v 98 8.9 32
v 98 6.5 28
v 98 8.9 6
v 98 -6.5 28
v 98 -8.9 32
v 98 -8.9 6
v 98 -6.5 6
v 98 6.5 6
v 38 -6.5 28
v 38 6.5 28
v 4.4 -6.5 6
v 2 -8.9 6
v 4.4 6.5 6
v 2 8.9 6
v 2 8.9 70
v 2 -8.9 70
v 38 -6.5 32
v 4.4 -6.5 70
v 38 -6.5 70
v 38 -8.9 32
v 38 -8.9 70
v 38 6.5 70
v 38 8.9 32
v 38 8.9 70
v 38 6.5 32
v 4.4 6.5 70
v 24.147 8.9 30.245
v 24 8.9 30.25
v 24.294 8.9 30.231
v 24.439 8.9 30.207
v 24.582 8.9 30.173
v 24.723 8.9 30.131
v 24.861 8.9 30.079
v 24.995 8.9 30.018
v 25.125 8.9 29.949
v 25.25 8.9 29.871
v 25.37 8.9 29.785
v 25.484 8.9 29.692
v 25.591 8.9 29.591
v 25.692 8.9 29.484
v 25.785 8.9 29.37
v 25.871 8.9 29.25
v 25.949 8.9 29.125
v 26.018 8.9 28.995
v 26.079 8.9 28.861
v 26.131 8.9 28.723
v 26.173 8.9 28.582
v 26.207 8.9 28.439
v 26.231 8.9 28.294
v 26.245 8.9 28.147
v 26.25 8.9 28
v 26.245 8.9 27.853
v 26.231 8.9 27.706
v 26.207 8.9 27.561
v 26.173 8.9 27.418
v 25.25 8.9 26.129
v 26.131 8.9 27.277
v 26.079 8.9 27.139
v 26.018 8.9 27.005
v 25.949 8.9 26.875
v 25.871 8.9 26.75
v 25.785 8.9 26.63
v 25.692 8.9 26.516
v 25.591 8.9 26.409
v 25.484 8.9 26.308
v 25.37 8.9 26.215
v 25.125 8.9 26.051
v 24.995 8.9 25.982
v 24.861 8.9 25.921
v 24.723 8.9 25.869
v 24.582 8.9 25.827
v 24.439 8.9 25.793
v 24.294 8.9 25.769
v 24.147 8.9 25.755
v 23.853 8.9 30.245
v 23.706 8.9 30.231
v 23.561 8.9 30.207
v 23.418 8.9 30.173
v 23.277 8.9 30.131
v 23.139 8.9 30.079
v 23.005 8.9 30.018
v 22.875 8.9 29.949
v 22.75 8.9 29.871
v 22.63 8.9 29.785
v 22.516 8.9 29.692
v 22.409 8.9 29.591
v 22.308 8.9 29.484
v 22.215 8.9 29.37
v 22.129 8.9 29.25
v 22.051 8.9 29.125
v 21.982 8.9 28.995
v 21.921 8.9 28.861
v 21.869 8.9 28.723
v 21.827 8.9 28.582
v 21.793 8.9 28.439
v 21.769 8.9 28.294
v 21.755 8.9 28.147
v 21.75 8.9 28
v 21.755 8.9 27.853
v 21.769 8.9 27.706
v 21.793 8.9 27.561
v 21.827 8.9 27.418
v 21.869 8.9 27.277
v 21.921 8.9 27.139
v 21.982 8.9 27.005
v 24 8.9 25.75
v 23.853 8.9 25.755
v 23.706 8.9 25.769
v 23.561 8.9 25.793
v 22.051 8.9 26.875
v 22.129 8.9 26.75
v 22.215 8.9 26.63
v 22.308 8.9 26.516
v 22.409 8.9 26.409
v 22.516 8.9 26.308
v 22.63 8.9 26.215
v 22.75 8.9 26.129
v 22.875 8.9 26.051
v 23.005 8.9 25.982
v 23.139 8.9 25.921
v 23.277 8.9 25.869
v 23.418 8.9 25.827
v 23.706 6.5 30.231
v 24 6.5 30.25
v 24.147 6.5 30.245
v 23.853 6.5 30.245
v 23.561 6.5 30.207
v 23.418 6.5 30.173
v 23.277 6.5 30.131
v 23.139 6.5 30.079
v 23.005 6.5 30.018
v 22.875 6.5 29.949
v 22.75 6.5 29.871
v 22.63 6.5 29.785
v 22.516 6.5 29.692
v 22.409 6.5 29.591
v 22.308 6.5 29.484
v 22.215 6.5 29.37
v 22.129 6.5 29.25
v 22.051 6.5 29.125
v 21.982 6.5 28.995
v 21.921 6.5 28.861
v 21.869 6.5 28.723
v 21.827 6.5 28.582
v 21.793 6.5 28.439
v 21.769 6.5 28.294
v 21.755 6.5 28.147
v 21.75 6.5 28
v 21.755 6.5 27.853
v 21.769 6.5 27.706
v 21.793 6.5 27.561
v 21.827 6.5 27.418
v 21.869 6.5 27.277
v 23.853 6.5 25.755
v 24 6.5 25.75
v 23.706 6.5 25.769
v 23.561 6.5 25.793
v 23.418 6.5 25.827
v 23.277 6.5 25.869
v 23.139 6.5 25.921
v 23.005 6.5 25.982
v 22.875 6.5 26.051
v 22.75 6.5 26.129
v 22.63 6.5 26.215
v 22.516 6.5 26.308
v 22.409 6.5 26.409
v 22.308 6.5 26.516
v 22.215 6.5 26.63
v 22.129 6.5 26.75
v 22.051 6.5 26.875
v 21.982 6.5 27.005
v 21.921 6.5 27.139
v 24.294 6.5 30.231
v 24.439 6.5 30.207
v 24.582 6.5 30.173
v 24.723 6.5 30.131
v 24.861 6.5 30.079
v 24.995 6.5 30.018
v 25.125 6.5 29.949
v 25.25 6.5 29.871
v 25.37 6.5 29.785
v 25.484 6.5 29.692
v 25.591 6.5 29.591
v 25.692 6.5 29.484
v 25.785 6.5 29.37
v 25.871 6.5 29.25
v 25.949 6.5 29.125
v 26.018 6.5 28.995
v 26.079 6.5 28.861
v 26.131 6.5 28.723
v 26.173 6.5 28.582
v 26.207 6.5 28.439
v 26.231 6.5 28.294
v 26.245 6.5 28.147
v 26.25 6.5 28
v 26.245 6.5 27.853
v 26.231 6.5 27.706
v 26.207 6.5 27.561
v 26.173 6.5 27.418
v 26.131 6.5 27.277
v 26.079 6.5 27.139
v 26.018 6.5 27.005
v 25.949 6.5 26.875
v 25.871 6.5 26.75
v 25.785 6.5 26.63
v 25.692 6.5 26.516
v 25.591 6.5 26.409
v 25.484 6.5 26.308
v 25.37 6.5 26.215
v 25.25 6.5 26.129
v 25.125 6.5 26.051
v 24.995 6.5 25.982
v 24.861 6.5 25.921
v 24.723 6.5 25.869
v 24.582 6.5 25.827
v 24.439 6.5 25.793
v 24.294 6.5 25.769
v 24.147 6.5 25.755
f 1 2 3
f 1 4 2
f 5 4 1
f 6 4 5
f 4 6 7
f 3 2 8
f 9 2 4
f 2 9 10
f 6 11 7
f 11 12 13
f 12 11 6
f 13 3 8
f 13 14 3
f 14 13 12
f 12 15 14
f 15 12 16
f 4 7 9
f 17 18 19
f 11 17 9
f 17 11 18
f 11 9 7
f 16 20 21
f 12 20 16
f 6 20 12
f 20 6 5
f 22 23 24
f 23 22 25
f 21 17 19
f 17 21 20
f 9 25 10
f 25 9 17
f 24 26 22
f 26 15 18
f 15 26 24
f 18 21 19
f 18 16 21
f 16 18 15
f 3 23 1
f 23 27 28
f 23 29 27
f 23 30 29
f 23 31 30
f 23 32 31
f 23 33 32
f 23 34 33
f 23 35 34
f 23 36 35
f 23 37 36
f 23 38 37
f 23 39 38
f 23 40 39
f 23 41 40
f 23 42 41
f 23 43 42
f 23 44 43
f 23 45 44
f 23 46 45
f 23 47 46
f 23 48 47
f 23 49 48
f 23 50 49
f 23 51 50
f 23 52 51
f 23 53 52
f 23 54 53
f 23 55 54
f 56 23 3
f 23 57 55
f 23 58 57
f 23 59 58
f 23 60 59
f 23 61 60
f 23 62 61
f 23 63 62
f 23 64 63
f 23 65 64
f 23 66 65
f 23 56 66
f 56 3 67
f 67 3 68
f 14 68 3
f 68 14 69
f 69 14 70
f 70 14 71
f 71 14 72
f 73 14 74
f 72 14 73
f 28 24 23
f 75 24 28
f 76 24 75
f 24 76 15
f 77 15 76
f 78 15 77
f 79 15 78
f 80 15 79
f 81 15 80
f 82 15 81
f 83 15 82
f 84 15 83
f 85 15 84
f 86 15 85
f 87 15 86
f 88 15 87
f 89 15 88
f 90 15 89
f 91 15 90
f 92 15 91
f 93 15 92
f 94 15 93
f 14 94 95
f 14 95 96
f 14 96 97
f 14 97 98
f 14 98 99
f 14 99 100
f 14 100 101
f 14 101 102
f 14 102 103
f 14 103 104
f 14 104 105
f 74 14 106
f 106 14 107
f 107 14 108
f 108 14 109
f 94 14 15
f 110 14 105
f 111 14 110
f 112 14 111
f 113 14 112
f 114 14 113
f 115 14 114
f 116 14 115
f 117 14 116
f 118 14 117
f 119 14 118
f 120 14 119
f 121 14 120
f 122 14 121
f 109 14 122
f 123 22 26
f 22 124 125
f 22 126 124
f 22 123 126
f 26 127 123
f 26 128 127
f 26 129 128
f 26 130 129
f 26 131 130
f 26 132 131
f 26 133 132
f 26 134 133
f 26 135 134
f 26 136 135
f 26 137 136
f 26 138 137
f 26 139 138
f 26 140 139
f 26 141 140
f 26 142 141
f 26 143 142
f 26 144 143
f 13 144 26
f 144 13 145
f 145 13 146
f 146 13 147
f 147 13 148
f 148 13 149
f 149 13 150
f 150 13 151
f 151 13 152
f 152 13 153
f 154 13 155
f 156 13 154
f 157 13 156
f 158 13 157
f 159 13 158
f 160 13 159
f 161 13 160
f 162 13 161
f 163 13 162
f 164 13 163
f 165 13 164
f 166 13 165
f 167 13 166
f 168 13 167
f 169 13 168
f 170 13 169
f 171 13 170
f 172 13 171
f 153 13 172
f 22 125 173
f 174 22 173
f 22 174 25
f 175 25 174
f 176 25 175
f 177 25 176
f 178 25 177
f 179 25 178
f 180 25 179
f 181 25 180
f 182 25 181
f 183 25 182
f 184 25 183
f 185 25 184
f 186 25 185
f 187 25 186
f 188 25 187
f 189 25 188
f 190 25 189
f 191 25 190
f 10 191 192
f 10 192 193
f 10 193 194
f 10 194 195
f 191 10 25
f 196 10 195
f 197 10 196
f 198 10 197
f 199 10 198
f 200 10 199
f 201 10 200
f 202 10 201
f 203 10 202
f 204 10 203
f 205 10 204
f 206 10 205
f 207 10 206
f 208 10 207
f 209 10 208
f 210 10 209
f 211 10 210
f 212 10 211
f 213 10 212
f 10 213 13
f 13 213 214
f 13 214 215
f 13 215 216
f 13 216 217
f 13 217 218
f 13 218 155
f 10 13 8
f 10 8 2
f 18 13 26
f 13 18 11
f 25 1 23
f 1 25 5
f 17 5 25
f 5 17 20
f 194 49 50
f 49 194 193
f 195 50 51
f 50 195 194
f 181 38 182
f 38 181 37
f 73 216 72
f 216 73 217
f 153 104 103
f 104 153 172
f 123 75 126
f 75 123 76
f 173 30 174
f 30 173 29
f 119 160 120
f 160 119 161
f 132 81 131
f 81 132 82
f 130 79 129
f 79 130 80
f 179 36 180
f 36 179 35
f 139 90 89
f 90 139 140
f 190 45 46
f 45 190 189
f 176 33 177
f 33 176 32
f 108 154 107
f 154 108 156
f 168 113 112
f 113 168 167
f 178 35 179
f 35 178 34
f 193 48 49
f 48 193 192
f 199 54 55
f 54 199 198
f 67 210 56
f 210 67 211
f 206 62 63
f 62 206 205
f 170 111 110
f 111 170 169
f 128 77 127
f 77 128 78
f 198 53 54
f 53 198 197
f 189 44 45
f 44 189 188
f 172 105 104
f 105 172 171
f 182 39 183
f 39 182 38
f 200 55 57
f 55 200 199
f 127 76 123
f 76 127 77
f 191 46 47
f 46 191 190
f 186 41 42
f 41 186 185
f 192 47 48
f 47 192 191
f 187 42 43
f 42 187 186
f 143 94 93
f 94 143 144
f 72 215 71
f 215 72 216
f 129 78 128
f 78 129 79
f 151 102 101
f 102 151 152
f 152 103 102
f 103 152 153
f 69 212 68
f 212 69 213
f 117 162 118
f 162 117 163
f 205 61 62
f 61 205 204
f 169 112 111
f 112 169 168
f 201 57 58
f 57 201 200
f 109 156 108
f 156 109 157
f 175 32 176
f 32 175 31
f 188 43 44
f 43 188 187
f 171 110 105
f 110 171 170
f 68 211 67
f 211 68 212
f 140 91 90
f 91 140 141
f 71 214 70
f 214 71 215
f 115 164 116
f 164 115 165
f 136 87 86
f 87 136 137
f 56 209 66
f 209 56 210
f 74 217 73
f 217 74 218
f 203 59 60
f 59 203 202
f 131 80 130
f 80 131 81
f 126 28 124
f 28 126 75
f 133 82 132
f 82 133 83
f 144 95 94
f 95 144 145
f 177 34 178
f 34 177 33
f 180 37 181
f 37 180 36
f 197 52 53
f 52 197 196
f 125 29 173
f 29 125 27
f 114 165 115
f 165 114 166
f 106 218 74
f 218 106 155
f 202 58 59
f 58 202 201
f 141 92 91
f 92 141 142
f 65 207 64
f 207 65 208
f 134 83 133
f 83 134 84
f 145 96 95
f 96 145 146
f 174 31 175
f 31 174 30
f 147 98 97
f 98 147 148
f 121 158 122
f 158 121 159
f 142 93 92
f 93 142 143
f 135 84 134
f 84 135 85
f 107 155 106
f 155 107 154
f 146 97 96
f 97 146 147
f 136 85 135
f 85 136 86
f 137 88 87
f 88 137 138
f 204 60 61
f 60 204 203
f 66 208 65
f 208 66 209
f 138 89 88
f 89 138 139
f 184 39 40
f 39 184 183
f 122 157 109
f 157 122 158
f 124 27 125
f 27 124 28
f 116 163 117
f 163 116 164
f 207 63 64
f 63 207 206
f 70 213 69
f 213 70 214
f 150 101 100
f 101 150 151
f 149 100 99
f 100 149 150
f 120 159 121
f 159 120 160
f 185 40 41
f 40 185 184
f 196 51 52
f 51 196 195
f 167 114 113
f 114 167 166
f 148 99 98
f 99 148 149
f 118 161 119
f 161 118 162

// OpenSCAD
// file: params.scad
// =====================================================================
//  PAO 发射器机械件 —— 全局参数
//  所有零件共用本文件，改这里即整体联动
//
//  坐标系：
//    X = 发射方向（0 = 尾端，base_x = 前端枪口）
//    Y = 横向（0 = 弹道中心线）
//    Z = 垂直（0 = 桌面，底板占 0..base_t）
//
//  工作原理（决定了下述拓扑）：
//    电机轴沿 Y 横穿；摩擦轮装在轴上、悬在弹道正上方。
//    弹丸靠重力从喉部落到轮下，被轮缘压住甩向 +X。
//    单轮从上方压弹 → 弹仓必须与轮共位，喉部即弹仓。
// =====================================================================

$fn = 96;

/* ================= 底板 ================= */
base_x    = 100;    // 底板长
base_y    = 65;     // 底板宽
base_t    = 6;      // 底板厚
corner_r  = 3;      // 底板圆角

/* ================= 弹道通道 ================= */
rail_gap  = 13;     // 通道净宽（issue #61 图上标注）
bar_wall  = 2.4;    // 筒壁厚
bar_x0    = 2;      // 筒/喉部起点 X
bar_x1    = 98;     // 筒终点 X（前端枪口）
throat_x1 = 38;     // 喉部终点 X（此后加盖成封闭弹道）
wall_top  = 22;     // 侧壁高（底板顶面以上）
throat_h  = 64;     // 喉部总高（须在轮顶之上留出储弹空间，至少 2 发）
bar_top_h = 4;      // 顶盖厚

/* ================= 弹丸 ================= */
ball_d    = 11;     // 纸团压实后直径

/* ================= 摩擦轮 ================= */
fw_r      = 12;     // 轮半径
fw_t      = 8;      // 轮宽
fw_x      = 24;     // 轮轴 X
shaft_d   = 4;      // 钢轴直径
fw_squeeze = 1;     // 轮缘压入弹丸的量
fw_zc     = base_t + ball_d - fw_squeeze + fw_r;   // 轴心高度（推导 = 28）

/* ================= 驱动组 ================= */
motor_d   = 24.4;   // 电机外径（130 型）
motor_clamp_l = 18; // 夹持长度
br_wall   = 6;      // 支架立板厚
br_y      = rail_gap / 2 + bar_wall + 2;   // 立板起始 Y（= 10.9）

/* ================= 弹仓 ================= */
mag_len   = throat_x1 - bar_x0 - bar_wall;  // 喉部可用储弹长
mag_d     = rail_gap;                        // 储弹腔内径 ≡ 通道宽

/* ================= 按钮座 ================= */
sw_d      = 12.2;   // 点触开关安装孔
sw_mount_x = 92;
sw_mount_y = -24;

/* ================= 送弹斜坡 ================= */
ramp_x0   = 4;      // 斜坡起点 X
ramp_x1   = 20;     // 斜坡终点 X（落入摩擦轮咬入区）
ramp_h    = 10;     // 斜坡起端高出底板顶面的量

/* ================= 紧固件 ================= */
screw_d   = 2.4;    // 自攻螺钉过孔
// file: parts.scad
// =====================================================================
//  PAO 发射器 —— 全部零件模块库
//  include <params.scad> 后调用下列 module；本文件自身不产生几何体
// =====================================================================

include <params.scad>

/* ---------------------------------------------------------------
   通用：圆角矩形板
   --------------------------------------------------------------- */
module rrect_plate(x0, y0, x1, y1, z0, z1, r) {
    hull()
        for (x = [x0 + r, x1 - r])
            for (y = [y0 + r, y1 - r])
                translate([x, y, z0]) cylinder(r = r, h = z1 - z0);
}

/* ---------------------------------------------------------------
   送弹斜坡：靠重力把弹丸送进轮下咬入区
   --------------------------------------------------------------- */
module feed_ramp() {
    hull() {
        translate([ramp_x0, -rail_gap / 2, base_t])
            cube([0.1, rail_gap, ramp_h]);
        translate([ramp_x1, -rail_gap / 2, base_t])
            cube([0.1, rail_gap, 0.1]);
    }
}

/* ===============================================================
   1. 底板 base-plate
   =============================================================== */
module base_plate() {
    difference() {
        union() {
            rrect_plate(0, -base_y / 2, base_x, base_y / 2, 0, base_t, corner_r);
            feed_ramp();
        }

        // 四角安装孔
        for (x = [10, base_x - 12])
            for (y = [-base_y / 2 + 10, base_y / 2 - 10])
                translate([x, y, -1]) cylinder(d = screw_d, h = base_t + 2);

        // 弹道筒固定孔（落在筒壁正下方）
        for (x = [16, 90])
            for (s = [-1, 1])
                translate([x, s * (rail_gap / 2 + bar_wall / 2), -1])
                    cylinder(d = screw_d, h = base_t + 2);

        // 驱动支架固定孔
        for (x = [fw_x - 10, fw_x + 10])
            translate([x, br_y + 14, -1]) cylinder(d = screw_d, h = base_t + 2);

        // 按钮座固定孔
        translate([sw_mount_x, sw_mount_y, -1]) cylinder(d = screw_d, h = base_t + 2);

        // 底面减重槽
        for (x = [42, 64, 84])
            translate([x, 0, 1.5]) hull() {
                translate([-6, -15, 0]) cylinder(r = 3, h = base_t);
                translate([6, -15, 0]) cylinder(r = 3, h = base_t);
                translate([-6, 15, 0]) cylinder(r = 3, h = base_t);
                translate([6, 15, 0]) cylinder(r = 3, h = base_t);
            }
    }
}

/* ===============================================================
   2. 弹道筒 + 弹仓喉部 barrel
   · 侧壁贯穿全长
   · 后段（bar_x0..throat_x1）加高成喉部，即弹仓
   · 前段（throat_x1..bar_x1）加盖成封闭弹道
   · 侧壁开轴孔让轮轴穿过
   =============================================================== */
module barrel() {
    z0 = base_t;

    module walls() {
        for (s = [-1, 1]) {
            y = s > 0 ? rail_gap / 2 : -rail_gap / 2 - bar_wall;
            // 基本侧壁（全长）
            translate([bar_x0, y, z0])
                cube([bar_x1 - bar_x0, bar_wall, wall_top]);
            // 喉部加高段
            translate([bar_x0, y, z0])
                cube([throat_x1 - bar_x0, bar_wall, throat_h]);
        }
        // 后端封板
        translate([bar_x0, -rail_gap / 2 - bar_wall, z0])
            cube([bar_wall, rail_gap + 2 * bar_wall, throat_h]);
    }

    module front_lid() {
        translate([throat_x1, -rail_gap / 2 - bar_wall, z0 + wall_top])
            cube([bar_x1 - throat_x1, rail_gap + 2 * bar_wall, bar_top_h]);
    }

    difference() {
        union() {
            walls();
            front_lid();
        }
        // 轴过孔（贯穿两侧壁）
        for (s = [-1, 1])
            translate([fw_x, s * (rail_gap / 2 + bar_wall + 1), fw_zc])
                rotate([90, 0, 0])
                    cylinder(d = shaft_d + 0.5, h = 2 * (bar_wall + 1));
    }
}

/* ===============================================================
   3. 摩擦轮 flywheel
   =============================================================== */
module flywheel() {
    difference() {
        union() {
            cylinder(r = fw_r, h = fw_t, center = true);
            cylinder(r = fw_r * 0.38, h = fw_t + 4, center = true);
        }
        cylinder(d = shaft_d + 0.15, h = fw_t + 6, center = true);
        // 轮缘环槽
        rotate_extrude(convexity = 4)
            translate([fw_r - 0.5, 0, 0]) circle(d = 1.6);
        // 减重孔
        for (a = [0 : 60 : 359])
            rotate([0, 0, a]) translate([fw_r * 0.68, 0, 0])
                cylinder(d = fw_r * 0.3, h = fw_t + 6, center = true);
    }
}

/* ===============================================================
   4. 驱动支架 drive-bracket
   立板 + 电机夹持筒 + 底板脚
   =============================================================== */
module drive_bracket() {
    difference() {
        union() {
            // 底板脚
            translate([fw_x - 16, br_y, base_t])
                cube([34, 20, 5]);
            // 立板
            translate([fw_x - 16, br_y, base_t])
                cube([34, br_wall, fw_zc + fw_r - base_t]);
            // 电机夹持筒
            translate([fw_x, br_y + br_wall, fw_zc])
                rotate([-90, 0, 0])
                    cylinder(d = motor_d + 6, h = motor_clamp_l);
        }
        // 轴过孔
        translate([fw_x, br_y - 1, fw_zc])
            rotate([-90, 0, 0])
                cylinder(d = shaft_d + 0.4, h = br_wall + 2);
        // 电机腔
        translate([fw_x, br_y + br_wall - 0.5, fw_zc])
            rotate([-90, 0, 0])
                cylinder(d = motor_d + 0.4, h = motor_clamp_l - 1);
        // 夹紧缝
        translate([fw_x, br_y + br_wall + motor_clamp_l / 2, fw_zc + motor_d / 2])
            cube([1.6, motor_clamp_l, 8], center = true);
        // 脚部螺钉孔
        for (x = [fw_x - 10, fw_x + 10])
            translate([x, br_y + 14, base_t - 1])
                cylinder(d = screw_d, h = 8);
    }
}

/* ===============================================================
   5. 按钮座 button-mount
   =============================================================== */
module button_mount() {
    w = 22; d = 16; t = 4; wall_h = 16;

    difference() {
        union() {
            translate([sw_mount_x - w / 2, sw_mount_y - d / 2, base_t])
                cube([w, d, t]);
            translate([sw_mount_x - w / 2, sw_mount_y + d / 2 - t, base_t])
                cube([w, t, wall_h]);
        }
        // 开关孔（轴向 Y）
        translate([sw_mount_x, sw_mount_y + d / 2 - t - 1, base_t + wall_h * 0.55])
            rotate([-90, 0, 0])
                cylinder(d = sw_d, h = t + 2);
        // 底板固定孔
        translate([sw_mount_x, sw_mount_y, base_t - 1])
            cylinder(d = screw_d, h = t + 2);
    }
}
// main file
// 弹道筒 + 弹仓喉部 —— 独立渲染入口

include <parts.scad>

barrel();
